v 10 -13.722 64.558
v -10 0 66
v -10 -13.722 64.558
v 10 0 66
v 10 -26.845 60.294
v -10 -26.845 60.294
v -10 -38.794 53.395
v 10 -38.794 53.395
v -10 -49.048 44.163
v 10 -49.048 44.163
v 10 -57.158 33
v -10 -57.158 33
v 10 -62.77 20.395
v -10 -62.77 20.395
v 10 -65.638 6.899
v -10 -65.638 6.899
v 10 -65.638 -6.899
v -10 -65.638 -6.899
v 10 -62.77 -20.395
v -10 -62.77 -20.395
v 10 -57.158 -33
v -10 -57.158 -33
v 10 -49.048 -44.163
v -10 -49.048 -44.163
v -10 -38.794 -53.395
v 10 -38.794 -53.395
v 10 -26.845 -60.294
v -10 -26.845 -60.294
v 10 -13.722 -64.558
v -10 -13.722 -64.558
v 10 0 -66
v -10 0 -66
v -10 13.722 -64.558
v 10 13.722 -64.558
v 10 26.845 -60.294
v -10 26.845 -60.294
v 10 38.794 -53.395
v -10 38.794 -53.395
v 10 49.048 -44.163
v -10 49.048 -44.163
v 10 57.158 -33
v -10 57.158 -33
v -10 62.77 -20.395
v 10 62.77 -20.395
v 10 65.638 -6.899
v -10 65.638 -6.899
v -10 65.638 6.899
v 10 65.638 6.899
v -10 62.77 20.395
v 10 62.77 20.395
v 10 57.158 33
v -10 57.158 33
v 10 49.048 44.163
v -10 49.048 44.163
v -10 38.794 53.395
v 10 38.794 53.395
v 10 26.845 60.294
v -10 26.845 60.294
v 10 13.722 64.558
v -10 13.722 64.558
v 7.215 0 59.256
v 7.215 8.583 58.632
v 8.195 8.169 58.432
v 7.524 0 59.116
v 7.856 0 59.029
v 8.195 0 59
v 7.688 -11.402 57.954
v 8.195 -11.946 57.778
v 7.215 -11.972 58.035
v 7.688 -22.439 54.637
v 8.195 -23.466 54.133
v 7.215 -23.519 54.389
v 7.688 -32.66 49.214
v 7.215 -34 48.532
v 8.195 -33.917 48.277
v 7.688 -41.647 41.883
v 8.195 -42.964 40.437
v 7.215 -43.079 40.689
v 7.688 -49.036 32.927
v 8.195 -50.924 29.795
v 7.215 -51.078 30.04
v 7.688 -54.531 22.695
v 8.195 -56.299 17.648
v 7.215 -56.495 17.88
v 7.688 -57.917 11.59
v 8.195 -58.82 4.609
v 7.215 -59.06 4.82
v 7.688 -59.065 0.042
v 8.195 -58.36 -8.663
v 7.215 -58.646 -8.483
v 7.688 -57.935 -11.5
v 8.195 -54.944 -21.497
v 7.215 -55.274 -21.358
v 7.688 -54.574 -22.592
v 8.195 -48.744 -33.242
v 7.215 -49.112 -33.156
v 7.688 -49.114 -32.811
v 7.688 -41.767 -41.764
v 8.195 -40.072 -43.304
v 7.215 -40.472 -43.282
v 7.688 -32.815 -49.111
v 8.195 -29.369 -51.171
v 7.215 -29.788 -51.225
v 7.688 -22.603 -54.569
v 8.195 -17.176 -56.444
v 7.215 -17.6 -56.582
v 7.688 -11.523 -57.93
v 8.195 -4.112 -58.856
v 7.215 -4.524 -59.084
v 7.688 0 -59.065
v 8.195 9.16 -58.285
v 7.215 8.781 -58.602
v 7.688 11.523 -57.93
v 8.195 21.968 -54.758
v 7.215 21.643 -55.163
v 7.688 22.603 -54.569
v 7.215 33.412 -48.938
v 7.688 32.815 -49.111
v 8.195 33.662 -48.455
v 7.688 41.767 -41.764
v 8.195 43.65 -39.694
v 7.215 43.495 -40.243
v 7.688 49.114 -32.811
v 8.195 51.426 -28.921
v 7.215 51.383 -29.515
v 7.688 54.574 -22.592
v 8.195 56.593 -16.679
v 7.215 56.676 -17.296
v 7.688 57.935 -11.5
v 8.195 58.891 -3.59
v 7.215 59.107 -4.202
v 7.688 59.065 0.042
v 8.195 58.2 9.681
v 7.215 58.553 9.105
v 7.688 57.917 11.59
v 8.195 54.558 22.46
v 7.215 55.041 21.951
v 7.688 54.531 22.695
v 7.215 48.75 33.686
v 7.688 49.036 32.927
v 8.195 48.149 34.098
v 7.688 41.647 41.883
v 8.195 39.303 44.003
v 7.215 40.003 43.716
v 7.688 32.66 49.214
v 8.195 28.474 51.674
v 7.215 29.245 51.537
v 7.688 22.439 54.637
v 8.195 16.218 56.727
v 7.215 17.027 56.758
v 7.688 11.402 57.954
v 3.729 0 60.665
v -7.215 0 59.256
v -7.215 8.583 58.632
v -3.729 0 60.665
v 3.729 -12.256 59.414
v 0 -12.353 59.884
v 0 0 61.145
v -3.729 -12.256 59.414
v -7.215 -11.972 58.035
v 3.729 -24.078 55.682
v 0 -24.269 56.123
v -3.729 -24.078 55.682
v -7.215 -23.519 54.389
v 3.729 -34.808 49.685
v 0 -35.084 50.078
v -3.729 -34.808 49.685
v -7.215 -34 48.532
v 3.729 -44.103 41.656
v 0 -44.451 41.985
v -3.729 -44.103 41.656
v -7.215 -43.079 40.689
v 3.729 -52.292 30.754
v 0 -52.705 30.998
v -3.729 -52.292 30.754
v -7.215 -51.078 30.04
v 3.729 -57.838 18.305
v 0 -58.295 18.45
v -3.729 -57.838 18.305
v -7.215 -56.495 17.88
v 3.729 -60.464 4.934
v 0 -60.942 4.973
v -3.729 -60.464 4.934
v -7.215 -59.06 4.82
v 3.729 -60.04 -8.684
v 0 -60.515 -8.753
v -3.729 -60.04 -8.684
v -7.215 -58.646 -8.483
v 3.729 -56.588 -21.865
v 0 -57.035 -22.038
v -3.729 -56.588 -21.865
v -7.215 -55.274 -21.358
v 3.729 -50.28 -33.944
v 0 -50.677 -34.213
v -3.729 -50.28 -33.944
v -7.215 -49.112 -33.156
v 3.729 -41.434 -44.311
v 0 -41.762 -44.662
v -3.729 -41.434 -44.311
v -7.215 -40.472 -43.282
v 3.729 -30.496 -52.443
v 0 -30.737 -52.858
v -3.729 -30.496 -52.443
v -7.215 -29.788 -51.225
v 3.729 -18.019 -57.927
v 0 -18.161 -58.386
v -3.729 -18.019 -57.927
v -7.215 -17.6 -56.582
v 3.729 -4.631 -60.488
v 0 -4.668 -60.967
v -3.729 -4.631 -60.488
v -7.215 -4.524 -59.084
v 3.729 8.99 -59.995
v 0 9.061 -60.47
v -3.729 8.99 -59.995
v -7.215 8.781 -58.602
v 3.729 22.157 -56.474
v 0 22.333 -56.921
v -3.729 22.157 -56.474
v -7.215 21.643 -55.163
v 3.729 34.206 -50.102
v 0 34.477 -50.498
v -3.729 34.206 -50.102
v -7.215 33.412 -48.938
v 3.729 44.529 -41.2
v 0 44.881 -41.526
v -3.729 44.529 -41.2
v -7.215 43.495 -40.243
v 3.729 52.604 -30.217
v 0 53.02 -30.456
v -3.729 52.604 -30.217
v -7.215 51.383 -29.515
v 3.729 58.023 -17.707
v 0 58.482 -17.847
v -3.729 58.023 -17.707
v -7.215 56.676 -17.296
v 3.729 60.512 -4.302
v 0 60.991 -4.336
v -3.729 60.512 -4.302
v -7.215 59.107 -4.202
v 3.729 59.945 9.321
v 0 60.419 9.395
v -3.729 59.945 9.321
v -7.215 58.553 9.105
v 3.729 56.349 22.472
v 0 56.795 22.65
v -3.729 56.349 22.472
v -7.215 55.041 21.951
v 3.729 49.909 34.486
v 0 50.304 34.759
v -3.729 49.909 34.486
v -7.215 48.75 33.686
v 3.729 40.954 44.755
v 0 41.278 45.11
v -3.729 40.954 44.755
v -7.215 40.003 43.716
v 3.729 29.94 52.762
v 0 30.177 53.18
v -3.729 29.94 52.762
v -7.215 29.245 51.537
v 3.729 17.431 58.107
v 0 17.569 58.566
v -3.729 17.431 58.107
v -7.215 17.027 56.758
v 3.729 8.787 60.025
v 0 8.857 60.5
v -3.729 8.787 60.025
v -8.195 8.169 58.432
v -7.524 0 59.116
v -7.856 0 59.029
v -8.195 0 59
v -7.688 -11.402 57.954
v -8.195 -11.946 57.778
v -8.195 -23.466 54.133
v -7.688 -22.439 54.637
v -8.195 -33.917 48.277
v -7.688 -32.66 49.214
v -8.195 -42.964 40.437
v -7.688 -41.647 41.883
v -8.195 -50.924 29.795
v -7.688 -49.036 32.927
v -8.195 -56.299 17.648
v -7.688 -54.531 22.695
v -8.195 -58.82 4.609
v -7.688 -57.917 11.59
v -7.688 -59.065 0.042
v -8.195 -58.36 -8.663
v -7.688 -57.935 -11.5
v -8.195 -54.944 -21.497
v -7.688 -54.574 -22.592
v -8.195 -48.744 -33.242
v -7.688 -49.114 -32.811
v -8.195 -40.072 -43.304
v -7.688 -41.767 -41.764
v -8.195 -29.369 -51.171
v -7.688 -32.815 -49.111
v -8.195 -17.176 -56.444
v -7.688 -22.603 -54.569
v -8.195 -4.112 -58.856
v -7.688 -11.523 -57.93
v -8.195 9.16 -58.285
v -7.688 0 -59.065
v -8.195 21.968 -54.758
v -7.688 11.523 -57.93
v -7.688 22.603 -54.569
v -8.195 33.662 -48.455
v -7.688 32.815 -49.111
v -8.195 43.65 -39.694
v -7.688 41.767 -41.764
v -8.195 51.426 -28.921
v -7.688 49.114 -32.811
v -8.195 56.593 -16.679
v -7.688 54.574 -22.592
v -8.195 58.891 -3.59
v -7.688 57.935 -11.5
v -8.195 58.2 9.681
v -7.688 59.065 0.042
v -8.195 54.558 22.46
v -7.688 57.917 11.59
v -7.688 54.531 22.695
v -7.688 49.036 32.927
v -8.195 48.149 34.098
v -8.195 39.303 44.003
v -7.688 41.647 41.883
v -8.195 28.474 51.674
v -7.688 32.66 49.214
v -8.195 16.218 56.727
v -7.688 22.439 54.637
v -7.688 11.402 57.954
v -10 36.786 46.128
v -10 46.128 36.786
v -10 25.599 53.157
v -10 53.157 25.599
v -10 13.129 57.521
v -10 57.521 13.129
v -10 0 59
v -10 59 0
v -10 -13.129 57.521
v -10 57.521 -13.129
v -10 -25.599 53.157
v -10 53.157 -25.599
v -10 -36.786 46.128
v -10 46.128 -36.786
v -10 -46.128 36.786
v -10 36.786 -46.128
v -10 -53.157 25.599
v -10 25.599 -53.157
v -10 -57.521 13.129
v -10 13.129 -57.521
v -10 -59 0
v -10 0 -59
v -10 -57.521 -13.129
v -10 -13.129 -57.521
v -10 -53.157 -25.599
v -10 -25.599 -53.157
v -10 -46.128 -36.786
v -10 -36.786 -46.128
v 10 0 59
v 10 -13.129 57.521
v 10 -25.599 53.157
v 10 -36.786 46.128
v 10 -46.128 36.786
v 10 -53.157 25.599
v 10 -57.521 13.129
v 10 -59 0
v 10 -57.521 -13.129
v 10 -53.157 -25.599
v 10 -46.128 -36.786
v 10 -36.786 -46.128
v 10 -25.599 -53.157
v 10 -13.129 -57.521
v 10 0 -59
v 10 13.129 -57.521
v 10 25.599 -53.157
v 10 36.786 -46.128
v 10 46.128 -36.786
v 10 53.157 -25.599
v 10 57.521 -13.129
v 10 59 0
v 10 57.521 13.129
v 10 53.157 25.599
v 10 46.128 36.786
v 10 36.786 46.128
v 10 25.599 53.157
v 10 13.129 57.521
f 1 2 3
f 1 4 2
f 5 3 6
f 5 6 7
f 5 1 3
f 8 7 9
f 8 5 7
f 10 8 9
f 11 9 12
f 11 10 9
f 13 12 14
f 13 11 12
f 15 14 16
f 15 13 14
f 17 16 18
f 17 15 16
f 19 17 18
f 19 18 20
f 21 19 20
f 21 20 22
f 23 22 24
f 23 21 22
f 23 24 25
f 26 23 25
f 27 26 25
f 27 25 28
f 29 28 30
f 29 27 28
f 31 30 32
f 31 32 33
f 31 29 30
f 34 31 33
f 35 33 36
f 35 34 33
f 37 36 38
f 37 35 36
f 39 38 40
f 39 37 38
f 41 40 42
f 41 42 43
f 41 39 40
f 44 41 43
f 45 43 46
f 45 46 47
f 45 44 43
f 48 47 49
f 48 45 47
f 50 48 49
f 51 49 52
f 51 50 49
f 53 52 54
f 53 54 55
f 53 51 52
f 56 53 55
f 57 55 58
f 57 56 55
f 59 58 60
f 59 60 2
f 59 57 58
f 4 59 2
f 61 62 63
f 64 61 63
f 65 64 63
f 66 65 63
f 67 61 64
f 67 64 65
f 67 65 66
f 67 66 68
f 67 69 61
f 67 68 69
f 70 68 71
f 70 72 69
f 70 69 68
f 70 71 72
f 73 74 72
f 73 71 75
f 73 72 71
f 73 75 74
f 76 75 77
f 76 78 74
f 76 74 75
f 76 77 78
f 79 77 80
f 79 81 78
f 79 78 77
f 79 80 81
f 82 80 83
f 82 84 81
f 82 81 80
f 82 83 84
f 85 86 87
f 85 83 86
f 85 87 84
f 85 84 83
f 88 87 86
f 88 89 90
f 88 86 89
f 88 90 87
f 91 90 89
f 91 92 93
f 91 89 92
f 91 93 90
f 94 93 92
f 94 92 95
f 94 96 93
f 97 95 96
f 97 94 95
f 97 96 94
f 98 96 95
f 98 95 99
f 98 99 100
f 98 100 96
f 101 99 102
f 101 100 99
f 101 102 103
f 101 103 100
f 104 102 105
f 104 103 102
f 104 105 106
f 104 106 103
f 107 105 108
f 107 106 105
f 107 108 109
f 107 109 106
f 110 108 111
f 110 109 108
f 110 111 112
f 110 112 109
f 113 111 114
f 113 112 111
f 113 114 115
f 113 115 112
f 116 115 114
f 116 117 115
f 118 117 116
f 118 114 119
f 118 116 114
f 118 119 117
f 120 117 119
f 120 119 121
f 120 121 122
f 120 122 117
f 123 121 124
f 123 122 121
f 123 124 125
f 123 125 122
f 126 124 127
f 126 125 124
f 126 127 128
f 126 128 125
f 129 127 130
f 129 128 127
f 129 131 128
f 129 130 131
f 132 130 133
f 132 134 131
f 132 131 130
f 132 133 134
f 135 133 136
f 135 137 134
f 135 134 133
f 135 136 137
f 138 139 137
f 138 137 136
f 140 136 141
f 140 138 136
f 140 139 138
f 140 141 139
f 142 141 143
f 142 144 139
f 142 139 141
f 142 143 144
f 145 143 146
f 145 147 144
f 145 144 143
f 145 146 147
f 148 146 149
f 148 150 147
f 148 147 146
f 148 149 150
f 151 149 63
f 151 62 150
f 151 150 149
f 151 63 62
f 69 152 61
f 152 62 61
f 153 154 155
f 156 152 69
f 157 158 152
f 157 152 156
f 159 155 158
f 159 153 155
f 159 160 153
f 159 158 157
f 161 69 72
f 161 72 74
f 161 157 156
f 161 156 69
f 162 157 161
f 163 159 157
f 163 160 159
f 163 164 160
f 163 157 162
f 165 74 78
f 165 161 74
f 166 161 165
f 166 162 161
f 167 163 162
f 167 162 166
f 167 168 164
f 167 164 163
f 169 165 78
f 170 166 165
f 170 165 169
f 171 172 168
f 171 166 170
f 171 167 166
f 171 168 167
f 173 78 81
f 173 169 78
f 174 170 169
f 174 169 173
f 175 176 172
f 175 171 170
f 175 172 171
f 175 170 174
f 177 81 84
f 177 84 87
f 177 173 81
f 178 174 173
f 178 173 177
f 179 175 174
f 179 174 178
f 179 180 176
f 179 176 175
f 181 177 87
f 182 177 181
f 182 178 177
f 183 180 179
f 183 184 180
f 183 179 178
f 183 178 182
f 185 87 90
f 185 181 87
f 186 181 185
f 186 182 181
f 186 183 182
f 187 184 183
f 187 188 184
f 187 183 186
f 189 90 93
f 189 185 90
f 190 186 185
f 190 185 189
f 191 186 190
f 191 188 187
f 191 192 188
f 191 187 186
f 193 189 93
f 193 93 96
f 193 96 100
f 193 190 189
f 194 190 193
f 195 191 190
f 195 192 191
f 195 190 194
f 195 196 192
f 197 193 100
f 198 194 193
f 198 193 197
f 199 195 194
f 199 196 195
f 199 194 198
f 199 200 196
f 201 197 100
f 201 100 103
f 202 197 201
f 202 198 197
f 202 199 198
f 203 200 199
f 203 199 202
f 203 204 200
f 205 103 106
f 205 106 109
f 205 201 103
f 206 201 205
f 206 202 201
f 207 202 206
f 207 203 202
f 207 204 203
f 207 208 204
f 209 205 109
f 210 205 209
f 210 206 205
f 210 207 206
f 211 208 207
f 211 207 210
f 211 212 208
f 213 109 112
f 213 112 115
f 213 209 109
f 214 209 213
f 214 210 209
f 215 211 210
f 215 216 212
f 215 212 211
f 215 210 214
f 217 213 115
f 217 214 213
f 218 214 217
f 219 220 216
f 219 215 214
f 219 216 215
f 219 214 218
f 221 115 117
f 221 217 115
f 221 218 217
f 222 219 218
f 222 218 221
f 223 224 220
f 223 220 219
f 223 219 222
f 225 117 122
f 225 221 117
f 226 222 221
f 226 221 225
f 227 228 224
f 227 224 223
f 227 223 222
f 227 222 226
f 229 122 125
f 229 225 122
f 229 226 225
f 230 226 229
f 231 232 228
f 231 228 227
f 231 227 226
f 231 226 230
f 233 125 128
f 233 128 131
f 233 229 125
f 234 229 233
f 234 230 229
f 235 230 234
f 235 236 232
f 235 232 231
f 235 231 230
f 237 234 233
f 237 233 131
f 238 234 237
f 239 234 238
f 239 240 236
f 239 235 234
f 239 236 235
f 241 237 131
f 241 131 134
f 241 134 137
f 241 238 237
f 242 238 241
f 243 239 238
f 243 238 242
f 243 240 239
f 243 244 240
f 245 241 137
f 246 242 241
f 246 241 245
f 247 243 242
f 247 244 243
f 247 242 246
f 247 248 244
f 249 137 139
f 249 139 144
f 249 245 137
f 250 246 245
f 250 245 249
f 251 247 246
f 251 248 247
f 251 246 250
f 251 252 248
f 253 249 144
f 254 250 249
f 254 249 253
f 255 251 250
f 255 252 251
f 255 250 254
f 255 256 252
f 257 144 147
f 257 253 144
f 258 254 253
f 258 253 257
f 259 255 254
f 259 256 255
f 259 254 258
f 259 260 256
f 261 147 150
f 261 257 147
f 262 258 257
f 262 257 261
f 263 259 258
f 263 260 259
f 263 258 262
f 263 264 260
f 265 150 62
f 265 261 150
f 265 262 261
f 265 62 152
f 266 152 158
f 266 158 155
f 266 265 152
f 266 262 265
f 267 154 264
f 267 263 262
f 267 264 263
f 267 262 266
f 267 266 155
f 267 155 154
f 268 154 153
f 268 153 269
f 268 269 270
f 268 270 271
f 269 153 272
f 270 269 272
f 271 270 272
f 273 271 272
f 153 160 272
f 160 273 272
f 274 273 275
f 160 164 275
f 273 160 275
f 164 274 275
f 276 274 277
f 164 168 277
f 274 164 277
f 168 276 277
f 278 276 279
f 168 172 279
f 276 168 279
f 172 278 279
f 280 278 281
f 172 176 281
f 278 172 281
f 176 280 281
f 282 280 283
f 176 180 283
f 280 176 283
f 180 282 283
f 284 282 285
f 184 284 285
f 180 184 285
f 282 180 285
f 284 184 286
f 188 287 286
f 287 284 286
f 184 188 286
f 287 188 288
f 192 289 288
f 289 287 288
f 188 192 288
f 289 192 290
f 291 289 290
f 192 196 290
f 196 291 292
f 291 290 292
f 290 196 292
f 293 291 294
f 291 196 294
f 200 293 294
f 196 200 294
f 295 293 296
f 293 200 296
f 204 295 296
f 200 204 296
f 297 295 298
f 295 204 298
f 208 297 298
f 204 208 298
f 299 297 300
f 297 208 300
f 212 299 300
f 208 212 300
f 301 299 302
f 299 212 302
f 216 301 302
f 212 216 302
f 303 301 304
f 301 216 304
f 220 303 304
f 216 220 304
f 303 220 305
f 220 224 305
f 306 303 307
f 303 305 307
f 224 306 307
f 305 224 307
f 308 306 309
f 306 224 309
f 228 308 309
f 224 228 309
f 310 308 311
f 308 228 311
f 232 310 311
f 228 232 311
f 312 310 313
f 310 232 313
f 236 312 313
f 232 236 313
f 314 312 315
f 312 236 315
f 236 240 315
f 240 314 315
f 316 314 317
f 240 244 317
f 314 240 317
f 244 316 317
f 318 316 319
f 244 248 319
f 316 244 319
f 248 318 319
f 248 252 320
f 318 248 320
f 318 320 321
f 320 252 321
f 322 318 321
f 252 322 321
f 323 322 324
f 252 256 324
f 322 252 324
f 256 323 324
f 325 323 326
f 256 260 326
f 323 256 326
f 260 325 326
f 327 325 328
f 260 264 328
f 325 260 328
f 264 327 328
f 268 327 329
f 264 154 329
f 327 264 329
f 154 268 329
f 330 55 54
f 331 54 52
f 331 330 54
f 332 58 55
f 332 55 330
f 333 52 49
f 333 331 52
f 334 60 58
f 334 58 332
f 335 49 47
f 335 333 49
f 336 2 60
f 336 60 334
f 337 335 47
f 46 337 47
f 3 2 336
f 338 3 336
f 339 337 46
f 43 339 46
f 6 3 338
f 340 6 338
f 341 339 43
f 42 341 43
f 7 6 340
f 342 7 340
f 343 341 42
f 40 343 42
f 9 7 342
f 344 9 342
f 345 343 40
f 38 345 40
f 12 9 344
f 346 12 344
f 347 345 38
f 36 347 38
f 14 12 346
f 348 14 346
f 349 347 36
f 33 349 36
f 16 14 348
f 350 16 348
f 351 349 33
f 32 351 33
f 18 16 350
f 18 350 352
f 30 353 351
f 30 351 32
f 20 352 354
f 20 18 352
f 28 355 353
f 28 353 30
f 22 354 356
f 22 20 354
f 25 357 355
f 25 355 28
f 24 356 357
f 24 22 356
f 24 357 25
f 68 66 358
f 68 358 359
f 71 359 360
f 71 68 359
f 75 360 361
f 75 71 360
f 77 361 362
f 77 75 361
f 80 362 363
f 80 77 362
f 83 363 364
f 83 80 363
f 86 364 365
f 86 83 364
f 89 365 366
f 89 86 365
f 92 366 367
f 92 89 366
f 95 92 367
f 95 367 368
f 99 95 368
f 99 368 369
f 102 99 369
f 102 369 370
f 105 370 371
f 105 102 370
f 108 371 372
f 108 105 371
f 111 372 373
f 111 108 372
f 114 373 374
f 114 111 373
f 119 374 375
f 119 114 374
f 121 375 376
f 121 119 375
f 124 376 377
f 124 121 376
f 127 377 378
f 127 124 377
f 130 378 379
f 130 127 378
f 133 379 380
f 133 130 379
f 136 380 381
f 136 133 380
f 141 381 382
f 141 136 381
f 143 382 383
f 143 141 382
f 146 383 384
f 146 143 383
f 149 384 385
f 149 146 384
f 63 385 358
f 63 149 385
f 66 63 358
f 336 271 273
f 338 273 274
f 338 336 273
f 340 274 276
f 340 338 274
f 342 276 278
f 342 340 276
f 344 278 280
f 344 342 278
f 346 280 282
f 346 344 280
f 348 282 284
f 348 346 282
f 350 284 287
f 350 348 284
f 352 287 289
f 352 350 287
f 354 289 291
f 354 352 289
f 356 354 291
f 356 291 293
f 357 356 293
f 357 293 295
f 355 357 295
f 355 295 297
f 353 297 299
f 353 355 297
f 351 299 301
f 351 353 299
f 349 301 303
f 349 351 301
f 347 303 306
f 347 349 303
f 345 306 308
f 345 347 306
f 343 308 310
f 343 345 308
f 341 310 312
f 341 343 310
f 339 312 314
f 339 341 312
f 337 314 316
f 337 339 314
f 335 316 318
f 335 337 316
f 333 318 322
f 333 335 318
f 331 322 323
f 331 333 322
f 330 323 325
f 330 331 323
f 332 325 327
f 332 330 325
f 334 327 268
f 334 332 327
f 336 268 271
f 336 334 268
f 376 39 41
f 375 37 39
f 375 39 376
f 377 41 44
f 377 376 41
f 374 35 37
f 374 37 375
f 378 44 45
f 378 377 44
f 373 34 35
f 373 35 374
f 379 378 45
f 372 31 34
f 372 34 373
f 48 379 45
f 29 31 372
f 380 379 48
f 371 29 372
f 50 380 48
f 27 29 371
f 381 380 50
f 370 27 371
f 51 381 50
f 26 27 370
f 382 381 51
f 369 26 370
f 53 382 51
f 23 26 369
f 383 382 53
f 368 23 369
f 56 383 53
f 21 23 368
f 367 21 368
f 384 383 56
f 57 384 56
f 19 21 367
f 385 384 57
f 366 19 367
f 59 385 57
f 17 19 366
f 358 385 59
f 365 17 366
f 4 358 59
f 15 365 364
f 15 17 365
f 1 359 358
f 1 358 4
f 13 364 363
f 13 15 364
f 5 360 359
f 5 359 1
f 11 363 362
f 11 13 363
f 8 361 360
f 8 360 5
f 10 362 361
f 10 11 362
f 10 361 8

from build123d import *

# Parameters (mm, degrees)
FILLET1_R = 2


with BuildPart() as part:
    # Sketch1 → Revolve5 (revolve)
    with BuildSketch(Plane.XY, mode=Mode.PRIVATE) as revolve5_sk:
        with BuildLine():
            ThreePointArc((7.653112519, 59), (0, 61.144988127), (-7.653112519, 59))
            Line((-7.653112519, 59), (-10, 59))
            Line((-10, 59), (-10, 66))
            Line((-10, 66), (10, 66))
            Line((10, 66), (10, 59))
            Line((10, 59), (7.653112519, 59))
        make_face()
    revolve(revolve5_sk.sketch.rotate(Axis((-1000, 0, 0), (1, 0, 0)), 90), axis=Axis((-1000, 0, 0), (1, 0, 0)))

    # Fillet1
    fillet1_edges = [part.edges().sort_by_distance(p)[0] for p in [
        (-7.653112519, 0, -59),
        (7.653112519, 0, -59),
    ]]
    fillet(fillet1_edges, radius=FILLET1_R)


solid = part.part
